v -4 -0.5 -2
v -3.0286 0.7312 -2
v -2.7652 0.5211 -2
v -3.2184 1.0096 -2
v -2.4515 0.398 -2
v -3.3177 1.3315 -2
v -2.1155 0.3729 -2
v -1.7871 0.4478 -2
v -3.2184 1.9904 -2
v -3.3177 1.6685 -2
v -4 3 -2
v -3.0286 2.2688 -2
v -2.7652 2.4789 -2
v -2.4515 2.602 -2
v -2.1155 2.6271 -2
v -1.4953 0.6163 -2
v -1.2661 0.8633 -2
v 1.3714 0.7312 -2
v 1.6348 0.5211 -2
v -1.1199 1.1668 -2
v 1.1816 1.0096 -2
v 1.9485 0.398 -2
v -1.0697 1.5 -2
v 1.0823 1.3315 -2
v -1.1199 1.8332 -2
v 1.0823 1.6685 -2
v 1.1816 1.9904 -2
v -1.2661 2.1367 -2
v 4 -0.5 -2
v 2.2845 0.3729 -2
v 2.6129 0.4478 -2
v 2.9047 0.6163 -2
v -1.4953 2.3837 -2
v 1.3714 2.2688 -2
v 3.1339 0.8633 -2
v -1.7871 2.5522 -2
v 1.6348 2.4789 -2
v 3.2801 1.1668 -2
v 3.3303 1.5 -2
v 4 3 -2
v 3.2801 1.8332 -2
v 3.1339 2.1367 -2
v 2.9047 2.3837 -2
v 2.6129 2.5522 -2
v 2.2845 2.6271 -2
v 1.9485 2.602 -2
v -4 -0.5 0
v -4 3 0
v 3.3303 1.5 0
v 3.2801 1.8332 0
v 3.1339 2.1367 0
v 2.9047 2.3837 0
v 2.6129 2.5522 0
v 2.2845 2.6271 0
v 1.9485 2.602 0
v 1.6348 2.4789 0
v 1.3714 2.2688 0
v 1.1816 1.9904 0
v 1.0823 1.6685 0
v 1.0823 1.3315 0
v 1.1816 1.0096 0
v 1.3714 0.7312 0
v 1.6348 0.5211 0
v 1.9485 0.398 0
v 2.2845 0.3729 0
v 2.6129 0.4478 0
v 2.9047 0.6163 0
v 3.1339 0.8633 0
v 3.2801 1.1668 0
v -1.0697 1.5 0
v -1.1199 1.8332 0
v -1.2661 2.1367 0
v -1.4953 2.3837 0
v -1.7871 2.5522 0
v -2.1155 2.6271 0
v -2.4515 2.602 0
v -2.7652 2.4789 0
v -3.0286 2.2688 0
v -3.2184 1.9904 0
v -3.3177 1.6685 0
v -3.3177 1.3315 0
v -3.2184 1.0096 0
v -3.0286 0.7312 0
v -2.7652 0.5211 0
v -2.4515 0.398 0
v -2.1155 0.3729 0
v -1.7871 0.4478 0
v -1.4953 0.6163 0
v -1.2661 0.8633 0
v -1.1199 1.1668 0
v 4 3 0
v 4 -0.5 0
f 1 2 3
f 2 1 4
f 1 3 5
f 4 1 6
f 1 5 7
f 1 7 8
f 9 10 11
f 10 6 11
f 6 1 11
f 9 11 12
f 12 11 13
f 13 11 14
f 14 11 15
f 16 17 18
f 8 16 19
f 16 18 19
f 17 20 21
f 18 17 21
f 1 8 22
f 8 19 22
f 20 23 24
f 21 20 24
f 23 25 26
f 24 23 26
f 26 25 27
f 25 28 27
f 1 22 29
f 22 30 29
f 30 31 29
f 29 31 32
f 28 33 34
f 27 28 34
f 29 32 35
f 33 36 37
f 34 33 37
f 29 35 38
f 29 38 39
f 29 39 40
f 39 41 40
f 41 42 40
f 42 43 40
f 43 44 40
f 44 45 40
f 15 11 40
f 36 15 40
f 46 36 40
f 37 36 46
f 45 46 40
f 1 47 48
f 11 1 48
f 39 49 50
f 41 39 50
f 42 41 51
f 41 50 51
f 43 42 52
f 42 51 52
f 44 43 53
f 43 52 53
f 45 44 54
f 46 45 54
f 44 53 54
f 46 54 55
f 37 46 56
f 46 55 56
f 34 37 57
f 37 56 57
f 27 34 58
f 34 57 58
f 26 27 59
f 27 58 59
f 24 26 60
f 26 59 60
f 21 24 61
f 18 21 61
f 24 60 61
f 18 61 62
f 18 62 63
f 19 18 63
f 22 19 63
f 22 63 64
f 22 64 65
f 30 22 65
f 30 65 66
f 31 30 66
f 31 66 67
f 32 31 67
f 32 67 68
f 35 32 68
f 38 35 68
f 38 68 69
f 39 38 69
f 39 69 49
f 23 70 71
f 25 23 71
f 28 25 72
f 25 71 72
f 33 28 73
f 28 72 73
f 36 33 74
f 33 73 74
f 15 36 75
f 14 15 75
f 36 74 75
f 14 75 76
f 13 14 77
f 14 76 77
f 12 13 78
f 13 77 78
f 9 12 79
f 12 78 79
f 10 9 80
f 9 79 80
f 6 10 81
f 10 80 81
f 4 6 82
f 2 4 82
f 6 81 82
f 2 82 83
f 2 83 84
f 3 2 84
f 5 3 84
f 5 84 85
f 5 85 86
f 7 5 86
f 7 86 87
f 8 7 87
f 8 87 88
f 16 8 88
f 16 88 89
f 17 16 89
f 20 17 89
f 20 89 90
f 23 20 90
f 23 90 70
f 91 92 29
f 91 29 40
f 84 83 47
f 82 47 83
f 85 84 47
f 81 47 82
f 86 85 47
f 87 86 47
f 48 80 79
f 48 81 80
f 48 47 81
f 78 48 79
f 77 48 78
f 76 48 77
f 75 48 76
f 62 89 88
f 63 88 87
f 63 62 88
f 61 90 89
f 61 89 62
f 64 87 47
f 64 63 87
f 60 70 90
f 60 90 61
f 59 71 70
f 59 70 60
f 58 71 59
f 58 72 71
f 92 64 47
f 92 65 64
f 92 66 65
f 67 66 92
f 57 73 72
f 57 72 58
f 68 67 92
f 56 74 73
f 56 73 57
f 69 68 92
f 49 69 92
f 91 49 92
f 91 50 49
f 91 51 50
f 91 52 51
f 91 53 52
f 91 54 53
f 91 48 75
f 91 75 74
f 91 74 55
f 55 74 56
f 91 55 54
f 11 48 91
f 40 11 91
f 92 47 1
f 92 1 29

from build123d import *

# Parameters (mm, degrees)
SKETCH1_W      = 8
SKETCH1_H      = 3.5
EXTRUDE1_DEPTH = 2
SKETCH2_R      = 1.1303
EXTRUDE2_DEPTH = 3


with BuildPart() as part:
    # Sketch1 → Extrude1 (new body)
    with BuildSketch(Plane.XY):
        with Locations((0, 1.25)):
            Rectangle(SKETCH1_W, SKETCH1_H)
    extrude(amount=-EXTRUDE1_DEPTH)

    # Sketch2 → Extrude2 (cut, through all)
    with BuildSketch(Plane.XY):
        with Locations((-2.2, 1.5)):
            Circle(SKETCH2_R)
        with Locations((2.2, 1.5)):
            Circle(SKETCH2_R)
    extrude(amount=-EXTRUDE2_DEPTH, mode=Mode.SUBTRACT)


solid = part.part
